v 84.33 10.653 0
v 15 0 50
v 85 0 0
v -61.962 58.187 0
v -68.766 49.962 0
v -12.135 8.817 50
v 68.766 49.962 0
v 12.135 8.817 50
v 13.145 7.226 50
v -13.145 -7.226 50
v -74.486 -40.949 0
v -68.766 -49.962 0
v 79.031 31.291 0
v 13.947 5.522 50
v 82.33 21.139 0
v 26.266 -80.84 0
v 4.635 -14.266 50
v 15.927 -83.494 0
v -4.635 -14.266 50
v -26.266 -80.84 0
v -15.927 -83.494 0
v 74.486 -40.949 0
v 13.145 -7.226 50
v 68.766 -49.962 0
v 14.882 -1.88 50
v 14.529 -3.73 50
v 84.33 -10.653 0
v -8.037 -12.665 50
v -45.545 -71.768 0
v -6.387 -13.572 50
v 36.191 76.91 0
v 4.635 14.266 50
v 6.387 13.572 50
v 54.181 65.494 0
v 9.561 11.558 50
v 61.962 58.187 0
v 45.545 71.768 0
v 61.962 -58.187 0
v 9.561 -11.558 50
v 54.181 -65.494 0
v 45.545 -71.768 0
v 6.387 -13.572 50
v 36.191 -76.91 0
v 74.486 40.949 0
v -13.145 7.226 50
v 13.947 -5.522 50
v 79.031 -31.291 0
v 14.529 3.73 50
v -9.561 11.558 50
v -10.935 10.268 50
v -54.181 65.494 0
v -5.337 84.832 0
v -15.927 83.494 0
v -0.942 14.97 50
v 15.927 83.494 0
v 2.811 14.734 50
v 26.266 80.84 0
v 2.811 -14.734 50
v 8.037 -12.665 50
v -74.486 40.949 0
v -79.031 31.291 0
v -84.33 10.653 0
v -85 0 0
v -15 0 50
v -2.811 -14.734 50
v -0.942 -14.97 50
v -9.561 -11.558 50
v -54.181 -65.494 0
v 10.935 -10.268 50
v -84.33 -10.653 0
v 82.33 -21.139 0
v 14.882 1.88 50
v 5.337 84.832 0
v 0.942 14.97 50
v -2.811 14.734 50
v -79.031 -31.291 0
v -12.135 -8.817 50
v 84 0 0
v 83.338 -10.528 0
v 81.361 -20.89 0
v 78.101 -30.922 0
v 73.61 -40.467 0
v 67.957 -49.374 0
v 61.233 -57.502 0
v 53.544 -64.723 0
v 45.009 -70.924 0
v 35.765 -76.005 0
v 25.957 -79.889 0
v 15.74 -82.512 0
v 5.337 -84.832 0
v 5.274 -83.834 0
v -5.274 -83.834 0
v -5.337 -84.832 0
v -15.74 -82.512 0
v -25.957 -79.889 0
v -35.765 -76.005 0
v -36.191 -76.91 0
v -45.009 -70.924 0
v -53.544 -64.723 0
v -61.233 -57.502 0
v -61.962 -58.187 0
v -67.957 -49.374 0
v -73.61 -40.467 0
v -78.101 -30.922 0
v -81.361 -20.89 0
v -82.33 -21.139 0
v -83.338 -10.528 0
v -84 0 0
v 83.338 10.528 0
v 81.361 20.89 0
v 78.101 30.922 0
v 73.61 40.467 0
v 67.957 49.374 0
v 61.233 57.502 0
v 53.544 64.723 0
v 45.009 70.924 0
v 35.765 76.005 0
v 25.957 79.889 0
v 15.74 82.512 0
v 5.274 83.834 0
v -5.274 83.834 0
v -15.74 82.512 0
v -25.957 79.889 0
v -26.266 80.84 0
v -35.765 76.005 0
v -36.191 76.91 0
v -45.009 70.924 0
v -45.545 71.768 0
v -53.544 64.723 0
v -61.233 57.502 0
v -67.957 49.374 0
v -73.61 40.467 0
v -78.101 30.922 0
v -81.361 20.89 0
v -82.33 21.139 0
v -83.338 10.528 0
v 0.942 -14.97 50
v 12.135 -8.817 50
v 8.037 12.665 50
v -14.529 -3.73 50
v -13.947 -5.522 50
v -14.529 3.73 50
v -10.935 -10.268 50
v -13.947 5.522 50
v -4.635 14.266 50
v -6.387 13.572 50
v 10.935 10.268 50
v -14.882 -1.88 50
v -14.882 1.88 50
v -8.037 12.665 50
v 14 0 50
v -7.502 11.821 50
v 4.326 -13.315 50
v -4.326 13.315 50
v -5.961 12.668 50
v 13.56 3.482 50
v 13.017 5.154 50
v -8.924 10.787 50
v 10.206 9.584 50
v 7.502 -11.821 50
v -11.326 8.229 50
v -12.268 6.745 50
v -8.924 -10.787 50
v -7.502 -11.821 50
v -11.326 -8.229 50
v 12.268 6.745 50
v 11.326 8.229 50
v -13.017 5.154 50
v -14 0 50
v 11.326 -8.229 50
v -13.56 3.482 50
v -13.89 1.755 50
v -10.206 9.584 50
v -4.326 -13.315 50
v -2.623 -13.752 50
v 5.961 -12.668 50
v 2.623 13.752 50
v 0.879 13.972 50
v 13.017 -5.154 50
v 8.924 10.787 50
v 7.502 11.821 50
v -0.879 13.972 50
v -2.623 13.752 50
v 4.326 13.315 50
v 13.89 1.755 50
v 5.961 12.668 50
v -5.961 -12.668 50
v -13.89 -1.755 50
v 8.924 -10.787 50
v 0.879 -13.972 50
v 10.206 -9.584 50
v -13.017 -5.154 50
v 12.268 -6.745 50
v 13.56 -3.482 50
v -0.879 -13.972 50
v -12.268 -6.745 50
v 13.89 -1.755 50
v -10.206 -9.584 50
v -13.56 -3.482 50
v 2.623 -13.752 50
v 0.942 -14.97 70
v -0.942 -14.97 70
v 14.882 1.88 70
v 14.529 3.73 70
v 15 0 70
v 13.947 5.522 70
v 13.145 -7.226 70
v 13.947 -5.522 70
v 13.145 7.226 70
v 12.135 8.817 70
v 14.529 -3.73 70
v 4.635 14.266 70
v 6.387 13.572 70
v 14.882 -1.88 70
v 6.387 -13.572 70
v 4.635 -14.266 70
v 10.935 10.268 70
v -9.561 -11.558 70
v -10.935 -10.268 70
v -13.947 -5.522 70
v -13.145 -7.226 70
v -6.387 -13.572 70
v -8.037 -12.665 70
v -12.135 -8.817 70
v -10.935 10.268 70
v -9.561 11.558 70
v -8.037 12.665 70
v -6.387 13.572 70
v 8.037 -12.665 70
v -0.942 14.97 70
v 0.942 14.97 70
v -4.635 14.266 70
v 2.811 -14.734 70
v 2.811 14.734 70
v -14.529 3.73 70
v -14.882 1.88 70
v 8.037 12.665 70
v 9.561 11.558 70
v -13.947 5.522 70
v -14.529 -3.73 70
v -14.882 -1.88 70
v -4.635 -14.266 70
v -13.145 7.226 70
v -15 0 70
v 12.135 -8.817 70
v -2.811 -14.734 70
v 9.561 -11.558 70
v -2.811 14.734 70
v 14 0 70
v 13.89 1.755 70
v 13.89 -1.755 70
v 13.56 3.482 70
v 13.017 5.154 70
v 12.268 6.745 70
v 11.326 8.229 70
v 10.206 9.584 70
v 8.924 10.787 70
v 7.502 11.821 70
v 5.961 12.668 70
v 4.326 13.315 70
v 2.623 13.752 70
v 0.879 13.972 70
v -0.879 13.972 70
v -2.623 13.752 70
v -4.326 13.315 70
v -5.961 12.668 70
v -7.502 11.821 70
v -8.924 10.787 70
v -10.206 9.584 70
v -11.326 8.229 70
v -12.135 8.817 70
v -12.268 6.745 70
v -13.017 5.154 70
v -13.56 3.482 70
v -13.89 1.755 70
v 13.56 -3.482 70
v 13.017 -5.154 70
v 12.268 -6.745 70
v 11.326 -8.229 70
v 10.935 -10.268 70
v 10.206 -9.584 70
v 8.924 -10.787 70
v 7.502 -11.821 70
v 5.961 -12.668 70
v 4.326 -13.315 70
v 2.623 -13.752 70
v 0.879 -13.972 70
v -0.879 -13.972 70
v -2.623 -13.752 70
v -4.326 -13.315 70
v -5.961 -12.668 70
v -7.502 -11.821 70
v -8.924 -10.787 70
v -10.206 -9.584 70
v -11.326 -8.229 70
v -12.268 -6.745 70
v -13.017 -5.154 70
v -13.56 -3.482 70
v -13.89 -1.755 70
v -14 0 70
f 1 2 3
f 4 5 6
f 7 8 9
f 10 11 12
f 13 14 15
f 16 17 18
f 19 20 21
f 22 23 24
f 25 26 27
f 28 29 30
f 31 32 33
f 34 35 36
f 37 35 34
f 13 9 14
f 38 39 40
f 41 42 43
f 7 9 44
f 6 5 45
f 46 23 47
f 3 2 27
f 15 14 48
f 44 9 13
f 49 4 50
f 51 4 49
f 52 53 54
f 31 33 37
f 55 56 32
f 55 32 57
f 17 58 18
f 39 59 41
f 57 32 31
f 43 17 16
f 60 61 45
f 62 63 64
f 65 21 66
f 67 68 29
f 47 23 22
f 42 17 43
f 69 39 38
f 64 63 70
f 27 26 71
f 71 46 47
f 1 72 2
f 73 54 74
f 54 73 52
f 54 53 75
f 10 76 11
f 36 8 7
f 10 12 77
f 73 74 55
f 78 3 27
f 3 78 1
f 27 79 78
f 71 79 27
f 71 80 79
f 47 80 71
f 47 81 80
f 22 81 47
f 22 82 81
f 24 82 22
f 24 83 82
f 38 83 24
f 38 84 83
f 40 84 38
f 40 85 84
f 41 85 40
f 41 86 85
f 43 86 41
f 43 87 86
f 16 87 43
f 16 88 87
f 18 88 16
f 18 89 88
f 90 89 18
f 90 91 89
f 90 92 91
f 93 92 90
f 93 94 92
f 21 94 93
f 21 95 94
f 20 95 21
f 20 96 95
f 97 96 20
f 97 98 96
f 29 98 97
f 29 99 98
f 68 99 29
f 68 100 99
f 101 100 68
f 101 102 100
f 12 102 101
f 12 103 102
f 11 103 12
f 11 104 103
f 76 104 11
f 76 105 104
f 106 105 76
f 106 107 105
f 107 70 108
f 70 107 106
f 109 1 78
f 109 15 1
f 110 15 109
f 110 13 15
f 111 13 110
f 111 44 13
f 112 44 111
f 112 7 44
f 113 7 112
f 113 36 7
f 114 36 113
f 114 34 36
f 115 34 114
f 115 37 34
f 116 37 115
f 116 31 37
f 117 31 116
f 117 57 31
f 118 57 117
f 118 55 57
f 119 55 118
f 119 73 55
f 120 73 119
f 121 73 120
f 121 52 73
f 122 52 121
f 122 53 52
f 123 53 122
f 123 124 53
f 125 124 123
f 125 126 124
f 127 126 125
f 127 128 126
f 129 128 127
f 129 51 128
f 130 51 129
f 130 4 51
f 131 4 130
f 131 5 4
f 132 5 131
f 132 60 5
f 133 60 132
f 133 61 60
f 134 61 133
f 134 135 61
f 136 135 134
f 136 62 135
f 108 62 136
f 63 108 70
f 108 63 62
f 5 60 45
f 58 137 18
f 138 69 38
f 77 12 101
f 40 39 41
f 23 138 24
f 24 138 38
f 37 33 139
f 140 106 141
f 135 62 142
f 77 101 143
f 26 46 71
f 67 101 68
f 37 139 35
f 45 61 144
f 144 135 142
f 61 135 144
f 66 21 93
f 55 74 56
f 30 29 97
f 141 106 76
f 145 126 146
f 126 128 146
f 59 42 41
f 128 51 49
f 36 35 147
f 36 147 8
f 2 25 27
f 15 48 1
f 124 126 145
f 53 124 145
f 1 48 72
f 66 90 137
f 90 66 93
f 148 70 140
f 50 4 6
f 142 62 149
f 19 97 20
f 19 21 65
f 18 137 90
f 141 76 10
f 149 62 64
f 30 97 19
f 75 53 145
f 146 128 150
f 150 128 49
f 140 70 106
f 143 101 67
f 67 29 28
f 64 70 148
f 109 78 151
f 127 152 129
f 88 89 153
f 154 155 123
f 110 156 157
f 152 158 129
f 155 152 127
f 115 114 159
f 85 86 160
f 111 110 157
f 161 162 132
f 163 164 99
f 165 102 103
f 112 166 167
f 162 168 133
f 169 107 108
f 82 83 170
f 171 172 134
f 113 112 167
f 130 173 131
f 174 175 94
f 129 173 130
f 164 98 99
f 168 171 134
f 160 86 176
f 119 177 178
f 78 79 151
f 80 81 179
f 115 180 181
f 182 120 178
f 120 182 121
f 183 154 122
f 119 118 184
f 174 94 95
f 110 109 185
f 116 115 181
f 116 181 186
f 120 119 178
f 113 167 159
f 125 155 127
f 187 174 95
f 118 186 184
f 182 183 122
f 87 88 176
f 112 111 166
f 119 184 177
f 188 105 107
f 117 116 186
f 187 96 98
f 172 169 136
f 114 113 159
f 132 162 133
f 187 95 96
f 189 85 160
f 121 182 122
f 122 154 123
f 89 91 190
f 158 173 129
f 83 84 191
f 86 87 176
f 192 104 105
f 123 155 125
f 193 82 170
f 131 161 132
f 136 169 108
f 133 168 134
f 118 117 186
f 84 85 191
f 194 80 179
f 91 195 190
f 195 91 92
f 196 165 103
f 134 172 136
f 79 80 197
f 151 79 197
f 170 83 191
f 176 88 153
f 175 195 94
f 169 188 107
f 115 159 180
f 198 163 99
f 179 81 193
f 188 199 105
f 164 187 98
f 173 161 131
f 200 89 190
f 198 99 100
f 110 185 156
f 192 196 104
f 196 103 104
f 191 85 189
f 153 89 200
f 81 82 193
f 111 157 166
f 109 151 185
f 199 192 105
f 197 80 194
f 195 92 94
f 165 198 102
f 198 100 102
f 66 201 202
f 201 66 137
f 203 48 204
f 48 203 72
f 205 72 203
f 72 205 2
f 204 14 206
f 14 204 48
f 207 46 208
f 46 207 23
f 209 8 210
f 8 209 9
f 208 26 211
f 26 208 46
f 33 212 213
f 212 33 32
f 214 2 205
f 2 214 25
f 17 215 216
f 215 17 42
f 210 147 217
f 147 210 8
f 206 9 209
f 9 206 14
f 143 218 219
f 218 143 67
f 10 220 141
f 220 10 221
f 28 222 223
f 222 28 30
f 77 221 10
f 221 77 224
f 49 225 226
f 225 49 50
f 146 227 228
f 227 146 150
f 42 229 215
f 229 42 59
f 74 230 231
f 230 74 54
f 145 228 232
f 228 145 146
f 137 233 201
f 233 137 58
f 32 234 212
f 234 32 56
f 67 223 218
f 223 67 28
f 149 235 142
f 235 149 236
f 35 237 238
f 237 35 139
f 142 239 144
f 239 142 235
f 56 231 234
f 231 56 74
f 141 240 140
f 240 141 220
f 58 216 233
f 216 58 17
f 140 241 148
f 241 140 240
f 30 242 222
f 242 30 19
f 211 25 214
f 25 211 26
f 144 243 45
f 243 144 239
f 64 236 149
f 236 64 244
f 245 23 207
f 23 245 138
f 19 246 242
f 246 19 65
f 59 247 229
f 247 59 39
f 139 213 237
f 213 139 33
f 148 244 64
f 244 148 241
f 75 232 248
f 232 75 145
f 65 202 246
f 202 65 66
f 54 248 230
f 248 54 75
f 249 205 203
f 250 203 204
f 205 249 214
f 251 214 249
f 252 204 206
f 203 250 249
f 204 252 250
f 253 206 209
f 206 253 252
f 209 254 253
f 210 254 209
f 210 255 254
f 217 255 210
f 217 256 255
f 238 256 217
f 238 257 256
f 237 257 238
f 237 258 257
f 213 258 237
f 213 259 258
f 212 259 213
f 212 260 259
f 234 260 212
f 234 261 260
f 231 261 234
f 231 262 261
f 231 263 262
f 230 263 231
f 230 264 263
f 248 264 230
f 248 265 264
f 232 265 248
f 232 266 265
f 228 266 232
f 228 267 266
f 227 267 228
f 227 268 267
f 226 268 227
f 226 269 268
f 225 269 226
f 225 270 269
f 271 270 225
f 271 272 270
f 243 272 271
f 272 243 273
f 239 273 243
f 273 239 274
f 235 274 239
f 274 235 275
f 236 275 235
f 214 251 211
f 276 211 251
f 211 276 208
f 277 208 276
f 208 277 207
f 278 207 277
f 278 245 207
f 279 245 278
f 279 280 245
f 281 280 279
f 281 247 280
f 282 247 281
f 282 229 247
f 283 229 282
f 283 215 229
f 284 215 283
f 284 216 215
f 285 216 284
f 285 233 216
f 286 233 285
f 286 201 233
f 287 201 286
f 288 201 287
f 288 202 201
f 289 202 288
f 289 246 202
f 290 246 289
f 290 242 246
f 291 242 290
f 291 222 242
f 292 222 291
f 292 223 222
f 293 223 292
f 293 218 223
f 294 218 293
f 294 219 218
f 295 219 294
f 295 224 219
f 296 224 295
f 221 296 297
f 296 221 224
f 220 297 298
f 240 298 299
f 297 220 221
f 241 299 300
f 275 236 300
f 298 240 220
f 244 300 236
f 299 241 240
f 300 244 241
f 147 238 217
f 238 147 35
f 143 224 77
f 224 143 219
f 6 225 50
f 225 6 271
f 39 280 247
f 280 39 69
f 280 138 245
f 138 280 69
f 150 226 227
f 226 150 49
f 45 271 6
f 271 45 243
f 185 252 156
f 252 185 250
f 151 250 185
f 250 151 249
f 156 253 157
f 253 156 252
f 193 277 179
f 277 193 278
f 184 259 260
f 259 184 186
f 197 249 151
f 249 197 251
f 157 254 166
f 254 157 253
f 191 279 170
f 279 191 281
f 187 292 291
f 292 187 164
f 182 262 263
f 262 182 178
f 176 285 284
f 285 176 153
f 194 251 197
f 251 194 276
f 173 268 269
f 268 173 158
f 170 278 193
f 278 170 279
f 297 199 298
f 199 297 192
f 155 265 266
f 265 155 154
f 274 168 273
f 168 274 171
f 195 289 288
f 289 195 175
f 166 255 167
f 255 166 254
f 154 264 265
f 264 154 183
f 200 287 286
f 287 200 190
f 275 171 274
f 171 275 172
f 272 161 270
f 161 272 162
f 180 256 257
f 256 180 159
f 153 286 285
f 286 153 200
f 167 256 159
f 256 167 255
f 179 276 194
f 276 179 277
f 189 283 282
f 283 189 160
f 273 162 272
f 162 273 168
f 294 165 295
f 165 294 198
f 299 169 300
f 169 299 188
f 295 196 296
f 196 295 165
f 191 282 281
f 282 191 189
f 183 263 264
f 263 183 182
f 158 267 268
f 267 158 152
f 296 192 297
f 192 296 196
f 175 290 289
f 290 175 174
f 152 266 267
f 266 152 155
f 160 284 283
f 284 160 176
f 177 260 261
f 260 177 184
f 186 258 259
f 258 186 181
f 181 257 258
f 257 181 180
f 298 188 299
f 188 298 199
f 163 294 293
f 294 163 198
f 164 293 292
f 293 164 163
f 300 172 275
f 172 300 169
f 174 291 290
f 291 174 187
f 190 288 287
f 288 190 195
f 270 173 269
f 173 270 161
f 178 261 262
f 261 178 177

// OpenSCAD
$fn = 50;


difference() {
	union() {
		translate(v = [0, 0, 0]) {
			rotate(a = [0, 0, 0]) {
				difference() {
					union() {
						cylinder(h = 50, r1 = 85.0000000000, r2 = 15.0000000000);
					}
					union() {
						cylinder(h = 50, r1 = 84.0000000000, r2 = 14.0000000000);
					}
				}
			}
		}
		translate(v = [0, 0, 50]) {
			rotate(a = [0, 0, 0]) {
				difference() {
					union() {
						cylinder(h = 20, r = 15.0000000000);
					}
					union() {
						cylinder(h = 20, r = 14.0000000000);
					}
				}
			}
		}
	}
	union();
}
